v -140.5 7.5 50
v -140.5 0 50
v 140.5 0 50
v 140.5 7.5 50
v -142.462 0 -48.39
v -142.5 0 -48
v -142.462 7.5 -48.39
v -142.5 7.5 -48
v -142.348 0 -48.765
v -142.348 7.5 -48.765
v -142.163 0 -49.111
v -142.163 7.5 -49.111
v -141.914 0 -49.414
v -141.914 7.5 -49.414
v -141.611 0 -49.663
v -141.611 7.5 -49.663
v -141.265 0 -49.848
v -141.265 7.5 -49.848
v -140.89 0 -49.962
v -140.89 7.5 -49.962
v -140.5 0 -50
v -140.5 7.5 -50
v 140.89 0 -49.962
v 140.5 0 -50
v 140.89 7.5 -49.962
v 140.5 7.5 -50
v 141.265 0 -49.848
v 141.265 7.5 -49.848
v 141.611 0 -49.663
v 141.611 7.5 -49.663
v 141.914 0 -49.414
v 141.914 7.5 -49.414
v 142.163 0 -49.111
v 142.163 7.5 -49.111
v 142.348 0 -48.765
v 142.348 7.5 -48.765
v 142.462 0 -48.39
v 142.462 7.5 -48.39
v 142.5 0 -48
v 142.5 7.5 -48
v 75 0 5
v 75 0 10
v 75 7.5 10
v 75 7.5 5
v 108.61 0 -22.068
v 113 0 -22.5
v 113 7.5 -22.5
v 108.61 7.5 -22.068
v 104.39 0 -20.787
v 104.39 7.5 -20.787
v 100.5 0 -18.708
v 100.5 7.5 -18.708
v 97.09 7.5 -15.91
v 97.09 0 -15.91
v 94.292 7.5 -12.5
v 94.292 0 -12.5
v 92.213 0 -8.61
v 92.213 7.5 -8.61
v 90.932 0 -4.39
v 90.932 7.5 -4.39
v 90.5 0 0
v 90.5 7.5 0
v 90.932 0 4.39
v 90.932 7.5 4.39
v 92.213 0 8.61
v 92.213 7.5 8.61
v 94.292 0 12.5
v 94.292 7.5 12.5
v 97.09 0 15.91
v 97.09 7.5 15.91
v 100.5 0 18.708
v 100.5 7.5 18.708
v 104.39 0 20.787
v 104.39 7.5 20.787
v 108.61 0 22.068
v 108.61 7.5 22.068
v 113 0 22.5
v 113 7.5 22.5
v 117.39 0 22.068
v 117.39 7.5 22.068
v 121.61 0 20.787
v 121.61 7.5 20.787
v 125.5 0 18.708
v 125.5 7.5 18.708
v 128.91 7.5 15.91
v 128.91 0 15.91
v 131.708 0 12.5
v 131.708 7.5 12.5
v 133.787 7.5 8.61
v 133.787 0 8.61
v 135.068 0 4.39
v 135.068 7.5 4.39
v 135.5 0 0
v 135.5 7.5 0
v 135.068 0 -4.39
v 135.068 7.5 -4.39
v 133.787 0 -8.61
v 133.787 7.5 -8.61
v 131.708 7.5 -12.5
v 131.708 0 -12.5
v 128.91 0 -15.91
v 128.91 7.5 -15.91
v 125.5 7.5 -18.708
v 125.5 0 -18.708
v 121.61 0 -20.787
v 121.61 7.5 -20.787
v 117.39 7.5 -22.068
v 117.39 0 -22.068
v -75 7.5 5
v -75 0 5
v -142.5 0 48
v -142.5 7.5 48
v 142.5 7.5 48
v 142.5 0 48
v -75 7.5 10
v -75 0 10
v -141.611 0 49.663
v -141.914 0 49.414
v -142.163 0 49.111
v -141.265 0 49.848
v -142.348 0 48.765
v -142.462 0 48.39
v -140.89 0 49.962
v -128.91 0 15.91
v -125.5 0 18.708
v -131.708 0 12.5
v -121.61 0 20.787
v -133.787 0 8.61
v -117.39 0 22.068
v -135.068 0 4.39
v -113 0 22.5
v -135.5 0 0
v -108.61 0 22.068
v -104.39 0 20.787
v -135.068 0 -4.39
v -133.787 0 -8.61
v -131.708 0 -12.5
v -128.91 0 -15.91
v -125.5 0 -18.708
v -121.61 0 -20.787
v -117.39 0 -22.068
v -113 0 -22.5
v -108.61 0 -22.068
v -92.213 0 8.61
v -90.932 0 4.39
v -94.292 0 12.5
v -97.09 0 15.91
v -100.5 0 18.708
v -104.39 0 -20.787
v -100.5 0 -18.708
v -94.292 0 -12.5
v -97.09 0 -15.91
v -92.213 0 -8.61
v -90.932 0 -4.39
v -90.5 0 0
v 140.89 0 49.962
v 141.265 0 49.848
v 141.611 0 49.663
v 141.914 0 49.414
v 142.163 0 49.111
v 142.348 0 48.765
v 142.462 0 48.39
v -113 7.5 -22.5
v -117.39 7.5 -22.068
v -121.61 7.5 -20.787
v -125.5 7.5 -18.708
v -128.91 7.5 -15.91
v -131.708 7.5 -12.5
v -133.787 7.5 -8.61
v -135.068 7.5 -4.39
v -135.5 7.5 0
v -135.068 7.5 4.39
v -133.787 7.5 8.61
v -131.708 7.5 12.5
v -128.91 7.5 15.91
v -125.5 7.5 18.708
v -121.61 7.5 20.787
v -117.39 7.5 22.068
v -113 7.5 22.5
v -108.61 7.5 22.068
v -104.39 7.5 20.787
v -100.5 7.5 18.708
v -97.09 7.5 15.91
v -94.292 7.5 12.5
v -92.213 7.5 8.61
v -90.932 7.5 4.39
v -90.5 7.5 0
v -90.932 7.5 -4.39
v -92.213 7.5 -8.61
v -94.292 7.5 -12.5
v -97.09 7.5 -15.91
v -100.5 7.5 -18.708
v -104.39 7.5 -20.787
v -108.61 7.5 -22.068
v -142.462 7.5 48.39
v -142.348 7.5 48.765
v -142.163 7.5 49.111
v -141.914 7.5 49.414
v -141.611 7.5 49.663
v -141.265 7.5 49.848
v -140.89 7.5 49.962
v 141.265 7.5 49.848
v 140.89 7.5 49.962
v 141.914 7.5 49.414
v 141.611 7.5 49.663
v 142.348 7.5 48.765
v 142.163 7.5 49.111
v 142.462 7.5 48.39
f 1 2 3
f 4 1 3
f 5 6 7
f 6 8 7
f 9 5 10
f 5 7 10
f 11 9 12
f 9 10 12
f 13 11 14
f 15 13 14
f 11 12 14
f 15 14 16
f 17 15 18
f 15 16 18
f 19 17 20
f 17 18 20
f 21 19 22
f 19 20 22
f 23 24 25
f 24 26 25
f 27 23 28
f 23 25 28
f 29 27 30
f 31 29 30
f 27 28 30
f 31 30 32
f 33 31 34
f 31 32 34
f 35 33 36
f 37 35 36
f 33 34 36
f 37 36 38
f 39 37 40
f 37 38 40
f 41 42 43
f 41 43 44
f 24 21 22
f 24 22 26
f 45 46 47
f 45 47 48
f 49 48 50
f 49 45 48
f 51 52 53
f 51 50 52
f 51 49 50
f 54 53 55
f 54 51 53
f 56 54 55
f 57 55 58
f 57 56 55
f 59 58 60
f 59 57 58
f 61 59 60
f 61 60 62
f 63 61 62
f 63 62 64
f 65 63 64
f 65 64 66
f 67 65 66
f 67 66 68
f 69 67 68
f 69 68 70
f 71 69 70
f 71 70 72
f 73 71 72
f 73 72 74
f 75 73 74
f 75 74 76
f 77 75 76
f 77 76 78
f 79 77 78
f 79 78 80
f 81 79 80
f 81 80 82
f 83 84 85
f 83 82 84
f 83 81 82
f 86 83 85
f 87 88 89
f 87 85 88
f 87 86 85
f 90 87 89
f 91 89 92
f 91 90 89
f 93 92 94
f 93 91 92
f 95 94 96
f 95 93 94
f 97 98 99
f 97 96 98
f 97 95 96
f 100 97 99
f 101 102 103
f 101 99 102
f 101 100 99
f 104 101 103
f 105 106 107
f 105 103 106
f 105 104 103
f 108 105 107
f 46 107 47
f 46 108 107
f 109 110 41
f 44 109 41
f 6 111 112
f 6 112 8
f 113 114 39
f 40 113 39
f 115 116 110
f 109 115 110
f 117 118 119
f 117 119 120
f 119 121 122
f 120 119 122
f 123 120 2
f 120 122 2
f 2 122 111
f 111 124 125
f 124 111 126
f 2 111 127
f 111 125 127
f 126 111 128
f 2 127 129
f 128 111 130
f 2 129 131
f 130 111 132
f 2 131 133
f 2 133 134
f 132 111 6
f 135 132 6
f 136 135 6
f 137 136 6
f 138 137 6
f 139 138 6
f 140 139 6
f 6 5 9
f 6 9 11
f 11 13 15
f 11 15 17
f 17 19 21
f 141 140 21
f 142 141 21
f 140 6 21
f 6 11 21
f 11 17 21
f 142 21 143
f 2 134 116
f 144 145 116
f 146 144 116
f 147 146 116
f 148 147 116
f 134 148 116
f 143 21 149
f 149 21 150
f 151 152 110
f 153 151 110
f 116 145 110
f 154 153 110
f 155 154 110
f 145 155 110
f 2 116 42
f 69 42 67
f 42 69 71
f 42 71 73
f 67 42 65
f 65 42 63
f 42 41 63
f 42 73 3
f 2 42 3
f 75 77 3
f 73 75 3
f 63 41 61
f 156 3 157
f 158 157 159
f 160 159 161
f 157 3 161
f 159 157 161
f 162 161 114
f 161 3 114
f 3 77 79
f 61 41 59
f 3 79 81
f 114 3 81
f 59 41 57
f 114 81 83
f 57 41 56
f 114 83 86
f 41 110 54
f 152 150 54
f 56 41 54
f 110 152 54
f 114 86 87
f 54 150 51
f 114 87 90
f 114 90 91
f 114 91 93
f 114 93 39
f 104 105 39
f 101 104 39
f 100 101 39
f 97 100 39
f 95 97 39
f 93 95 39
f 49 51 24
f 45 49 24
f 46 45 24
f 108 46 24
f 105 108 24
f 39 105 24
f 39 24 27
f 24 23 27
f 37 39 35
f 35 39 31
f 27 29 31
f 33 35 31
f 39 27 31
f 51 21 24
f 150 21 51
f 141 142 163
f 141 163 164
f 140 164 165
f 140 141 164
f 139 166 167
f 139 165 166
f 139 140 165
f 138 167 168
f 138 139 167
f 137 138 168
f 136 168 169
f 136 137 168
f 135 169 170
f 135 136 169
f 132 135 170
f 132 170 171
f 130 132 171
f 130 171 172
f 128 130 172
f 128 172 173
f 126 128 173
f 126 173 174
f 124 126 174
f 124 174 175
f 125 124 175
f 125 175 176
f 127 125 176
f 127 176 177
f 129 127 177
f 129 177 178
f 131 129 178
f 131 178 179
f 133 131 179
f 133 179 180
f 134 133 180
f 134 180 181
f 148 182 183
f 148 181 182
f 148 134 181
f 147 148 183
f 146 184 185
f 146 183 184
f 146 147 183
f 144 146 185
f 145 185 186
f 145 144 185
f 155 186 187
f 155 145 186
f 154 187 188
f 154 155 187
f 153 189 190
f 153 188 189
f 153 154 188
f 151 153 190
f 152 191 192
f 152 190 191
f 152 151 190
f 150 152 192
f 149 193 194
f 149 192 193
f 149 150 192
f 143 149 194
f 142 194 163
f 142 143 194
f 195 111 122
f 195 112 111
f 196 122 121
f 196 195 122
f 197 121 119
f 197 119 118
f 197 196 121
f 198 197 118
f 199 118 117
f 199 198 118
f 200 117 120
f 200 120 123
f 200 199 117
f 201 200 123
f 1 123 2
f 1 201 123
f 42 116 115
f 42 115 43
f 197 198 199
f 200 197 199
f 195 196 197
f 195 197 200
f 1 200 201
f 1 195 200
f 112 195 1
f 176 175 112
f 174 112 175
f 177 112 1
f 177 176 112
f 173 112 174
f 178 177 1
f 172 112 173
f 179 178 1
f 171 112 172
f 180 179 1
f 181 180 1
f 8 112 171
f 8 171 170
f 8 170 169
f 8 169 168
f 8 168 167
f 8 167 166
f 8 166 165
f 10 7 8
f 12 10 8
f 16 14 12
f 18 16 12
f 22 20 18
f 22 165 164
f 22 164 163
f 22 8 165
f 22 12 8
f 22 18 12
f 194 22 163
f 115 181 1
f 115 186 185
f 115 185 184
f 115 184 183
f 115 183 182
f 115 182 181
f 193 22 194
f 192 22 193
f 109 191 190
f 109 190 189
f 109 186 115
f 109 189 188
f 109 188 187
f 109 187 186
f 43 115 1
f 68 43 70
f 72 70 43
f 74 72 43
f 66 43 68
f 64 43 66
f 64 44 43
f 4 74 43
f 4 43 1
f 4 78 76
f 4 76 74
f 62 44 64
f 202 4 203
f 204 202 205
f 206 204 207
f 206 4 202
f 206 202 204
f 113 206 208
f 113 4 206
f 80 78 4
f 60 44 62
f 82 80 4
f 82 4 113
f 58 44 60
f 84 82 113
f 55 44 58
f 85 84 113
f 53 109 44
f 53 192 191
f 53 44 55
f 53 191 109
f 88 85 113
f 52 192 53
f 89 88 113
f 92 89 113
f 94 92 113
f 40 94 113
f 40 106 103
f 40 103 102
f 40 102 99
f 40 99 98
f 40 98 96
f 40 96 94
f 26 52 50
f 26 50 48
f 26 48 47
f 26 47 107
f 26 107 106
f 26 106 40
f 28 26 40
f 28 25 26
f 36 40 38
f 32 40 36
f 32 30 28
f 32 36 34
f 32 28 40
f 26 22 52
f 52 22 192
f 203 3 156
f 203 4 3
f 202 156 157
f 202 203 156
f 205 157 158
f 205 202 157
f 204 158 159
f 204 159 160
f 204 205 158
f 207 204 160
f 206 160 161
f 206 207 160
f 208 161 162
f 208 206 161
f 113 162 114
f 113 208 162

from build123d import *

# Parameters (mm, degrees)
SKETCH1_W               = 285
SKETCH1_H               = 100
BOSS_EXTRUDE1_DEPTH     = 7.5
CUT_EXTRUDE1_DEPTH      = 152.20350525
CUT_EXTRUDE1_DEPTH_BACK = 10
SKETCH2_R               = 22.5
SKETCH2_W               = 150
SKETCH2_H               = 5
FILLET1_R               = 2


with BuildPart() as part:
    # Sketch1 → Boss-Extrude1 (new body)
    with BuildSketch(Plane(origin=(0, 0, 0), x_dir=(1, 0, 0), z_dir=(0, 1, 0))):
        Rectangle(SKETCH1_W, SKETCH1_H)
    extrude(amount=BOSS_EXTRUDE1_DEPTH)

    # Sketch2 → Cut-Extrude1 (cut, two sides: drawn at the far end of the back side and taken through both)
    with BuildSketch(Plane(origin=(0, 7.5, 0), x_dir=(1, 0, 0), z_dir=(0, 1, 0)).offset(-CUT_EXTRUDE1_DEPTH_BACK)):
        with Locations(Location((-113, 0, 0), (0, 0, 90))):
            Circle(SKETCH2_R)
        with Locations(Location((113, 0, 0), (0, 0, 90))):
            Circle(SKETCH2_R)
        with Locations((0, -7.5)):
            Rectangle(SKETCH2_W, SKETCH2_H)
    extrude(amount=CUT_EXTRUDE1_DEPTH + CUT_EXTRUDE1_DEPTH_BACK, mode=Mode.SUBTRACT)

    # Fillet1
    fillet1_edges = [part.edges().sort_by_distance(p)[0] for p in [
        (142.5, 3.75, 50),
        (-142.5, 3.75, 50),
        (-142.5, 3.75, -50),
        (142.5, 3.75, -50),
    ]]
    fillet(fillet1_edges, radius=FILLET1_R)


solid = part.part
